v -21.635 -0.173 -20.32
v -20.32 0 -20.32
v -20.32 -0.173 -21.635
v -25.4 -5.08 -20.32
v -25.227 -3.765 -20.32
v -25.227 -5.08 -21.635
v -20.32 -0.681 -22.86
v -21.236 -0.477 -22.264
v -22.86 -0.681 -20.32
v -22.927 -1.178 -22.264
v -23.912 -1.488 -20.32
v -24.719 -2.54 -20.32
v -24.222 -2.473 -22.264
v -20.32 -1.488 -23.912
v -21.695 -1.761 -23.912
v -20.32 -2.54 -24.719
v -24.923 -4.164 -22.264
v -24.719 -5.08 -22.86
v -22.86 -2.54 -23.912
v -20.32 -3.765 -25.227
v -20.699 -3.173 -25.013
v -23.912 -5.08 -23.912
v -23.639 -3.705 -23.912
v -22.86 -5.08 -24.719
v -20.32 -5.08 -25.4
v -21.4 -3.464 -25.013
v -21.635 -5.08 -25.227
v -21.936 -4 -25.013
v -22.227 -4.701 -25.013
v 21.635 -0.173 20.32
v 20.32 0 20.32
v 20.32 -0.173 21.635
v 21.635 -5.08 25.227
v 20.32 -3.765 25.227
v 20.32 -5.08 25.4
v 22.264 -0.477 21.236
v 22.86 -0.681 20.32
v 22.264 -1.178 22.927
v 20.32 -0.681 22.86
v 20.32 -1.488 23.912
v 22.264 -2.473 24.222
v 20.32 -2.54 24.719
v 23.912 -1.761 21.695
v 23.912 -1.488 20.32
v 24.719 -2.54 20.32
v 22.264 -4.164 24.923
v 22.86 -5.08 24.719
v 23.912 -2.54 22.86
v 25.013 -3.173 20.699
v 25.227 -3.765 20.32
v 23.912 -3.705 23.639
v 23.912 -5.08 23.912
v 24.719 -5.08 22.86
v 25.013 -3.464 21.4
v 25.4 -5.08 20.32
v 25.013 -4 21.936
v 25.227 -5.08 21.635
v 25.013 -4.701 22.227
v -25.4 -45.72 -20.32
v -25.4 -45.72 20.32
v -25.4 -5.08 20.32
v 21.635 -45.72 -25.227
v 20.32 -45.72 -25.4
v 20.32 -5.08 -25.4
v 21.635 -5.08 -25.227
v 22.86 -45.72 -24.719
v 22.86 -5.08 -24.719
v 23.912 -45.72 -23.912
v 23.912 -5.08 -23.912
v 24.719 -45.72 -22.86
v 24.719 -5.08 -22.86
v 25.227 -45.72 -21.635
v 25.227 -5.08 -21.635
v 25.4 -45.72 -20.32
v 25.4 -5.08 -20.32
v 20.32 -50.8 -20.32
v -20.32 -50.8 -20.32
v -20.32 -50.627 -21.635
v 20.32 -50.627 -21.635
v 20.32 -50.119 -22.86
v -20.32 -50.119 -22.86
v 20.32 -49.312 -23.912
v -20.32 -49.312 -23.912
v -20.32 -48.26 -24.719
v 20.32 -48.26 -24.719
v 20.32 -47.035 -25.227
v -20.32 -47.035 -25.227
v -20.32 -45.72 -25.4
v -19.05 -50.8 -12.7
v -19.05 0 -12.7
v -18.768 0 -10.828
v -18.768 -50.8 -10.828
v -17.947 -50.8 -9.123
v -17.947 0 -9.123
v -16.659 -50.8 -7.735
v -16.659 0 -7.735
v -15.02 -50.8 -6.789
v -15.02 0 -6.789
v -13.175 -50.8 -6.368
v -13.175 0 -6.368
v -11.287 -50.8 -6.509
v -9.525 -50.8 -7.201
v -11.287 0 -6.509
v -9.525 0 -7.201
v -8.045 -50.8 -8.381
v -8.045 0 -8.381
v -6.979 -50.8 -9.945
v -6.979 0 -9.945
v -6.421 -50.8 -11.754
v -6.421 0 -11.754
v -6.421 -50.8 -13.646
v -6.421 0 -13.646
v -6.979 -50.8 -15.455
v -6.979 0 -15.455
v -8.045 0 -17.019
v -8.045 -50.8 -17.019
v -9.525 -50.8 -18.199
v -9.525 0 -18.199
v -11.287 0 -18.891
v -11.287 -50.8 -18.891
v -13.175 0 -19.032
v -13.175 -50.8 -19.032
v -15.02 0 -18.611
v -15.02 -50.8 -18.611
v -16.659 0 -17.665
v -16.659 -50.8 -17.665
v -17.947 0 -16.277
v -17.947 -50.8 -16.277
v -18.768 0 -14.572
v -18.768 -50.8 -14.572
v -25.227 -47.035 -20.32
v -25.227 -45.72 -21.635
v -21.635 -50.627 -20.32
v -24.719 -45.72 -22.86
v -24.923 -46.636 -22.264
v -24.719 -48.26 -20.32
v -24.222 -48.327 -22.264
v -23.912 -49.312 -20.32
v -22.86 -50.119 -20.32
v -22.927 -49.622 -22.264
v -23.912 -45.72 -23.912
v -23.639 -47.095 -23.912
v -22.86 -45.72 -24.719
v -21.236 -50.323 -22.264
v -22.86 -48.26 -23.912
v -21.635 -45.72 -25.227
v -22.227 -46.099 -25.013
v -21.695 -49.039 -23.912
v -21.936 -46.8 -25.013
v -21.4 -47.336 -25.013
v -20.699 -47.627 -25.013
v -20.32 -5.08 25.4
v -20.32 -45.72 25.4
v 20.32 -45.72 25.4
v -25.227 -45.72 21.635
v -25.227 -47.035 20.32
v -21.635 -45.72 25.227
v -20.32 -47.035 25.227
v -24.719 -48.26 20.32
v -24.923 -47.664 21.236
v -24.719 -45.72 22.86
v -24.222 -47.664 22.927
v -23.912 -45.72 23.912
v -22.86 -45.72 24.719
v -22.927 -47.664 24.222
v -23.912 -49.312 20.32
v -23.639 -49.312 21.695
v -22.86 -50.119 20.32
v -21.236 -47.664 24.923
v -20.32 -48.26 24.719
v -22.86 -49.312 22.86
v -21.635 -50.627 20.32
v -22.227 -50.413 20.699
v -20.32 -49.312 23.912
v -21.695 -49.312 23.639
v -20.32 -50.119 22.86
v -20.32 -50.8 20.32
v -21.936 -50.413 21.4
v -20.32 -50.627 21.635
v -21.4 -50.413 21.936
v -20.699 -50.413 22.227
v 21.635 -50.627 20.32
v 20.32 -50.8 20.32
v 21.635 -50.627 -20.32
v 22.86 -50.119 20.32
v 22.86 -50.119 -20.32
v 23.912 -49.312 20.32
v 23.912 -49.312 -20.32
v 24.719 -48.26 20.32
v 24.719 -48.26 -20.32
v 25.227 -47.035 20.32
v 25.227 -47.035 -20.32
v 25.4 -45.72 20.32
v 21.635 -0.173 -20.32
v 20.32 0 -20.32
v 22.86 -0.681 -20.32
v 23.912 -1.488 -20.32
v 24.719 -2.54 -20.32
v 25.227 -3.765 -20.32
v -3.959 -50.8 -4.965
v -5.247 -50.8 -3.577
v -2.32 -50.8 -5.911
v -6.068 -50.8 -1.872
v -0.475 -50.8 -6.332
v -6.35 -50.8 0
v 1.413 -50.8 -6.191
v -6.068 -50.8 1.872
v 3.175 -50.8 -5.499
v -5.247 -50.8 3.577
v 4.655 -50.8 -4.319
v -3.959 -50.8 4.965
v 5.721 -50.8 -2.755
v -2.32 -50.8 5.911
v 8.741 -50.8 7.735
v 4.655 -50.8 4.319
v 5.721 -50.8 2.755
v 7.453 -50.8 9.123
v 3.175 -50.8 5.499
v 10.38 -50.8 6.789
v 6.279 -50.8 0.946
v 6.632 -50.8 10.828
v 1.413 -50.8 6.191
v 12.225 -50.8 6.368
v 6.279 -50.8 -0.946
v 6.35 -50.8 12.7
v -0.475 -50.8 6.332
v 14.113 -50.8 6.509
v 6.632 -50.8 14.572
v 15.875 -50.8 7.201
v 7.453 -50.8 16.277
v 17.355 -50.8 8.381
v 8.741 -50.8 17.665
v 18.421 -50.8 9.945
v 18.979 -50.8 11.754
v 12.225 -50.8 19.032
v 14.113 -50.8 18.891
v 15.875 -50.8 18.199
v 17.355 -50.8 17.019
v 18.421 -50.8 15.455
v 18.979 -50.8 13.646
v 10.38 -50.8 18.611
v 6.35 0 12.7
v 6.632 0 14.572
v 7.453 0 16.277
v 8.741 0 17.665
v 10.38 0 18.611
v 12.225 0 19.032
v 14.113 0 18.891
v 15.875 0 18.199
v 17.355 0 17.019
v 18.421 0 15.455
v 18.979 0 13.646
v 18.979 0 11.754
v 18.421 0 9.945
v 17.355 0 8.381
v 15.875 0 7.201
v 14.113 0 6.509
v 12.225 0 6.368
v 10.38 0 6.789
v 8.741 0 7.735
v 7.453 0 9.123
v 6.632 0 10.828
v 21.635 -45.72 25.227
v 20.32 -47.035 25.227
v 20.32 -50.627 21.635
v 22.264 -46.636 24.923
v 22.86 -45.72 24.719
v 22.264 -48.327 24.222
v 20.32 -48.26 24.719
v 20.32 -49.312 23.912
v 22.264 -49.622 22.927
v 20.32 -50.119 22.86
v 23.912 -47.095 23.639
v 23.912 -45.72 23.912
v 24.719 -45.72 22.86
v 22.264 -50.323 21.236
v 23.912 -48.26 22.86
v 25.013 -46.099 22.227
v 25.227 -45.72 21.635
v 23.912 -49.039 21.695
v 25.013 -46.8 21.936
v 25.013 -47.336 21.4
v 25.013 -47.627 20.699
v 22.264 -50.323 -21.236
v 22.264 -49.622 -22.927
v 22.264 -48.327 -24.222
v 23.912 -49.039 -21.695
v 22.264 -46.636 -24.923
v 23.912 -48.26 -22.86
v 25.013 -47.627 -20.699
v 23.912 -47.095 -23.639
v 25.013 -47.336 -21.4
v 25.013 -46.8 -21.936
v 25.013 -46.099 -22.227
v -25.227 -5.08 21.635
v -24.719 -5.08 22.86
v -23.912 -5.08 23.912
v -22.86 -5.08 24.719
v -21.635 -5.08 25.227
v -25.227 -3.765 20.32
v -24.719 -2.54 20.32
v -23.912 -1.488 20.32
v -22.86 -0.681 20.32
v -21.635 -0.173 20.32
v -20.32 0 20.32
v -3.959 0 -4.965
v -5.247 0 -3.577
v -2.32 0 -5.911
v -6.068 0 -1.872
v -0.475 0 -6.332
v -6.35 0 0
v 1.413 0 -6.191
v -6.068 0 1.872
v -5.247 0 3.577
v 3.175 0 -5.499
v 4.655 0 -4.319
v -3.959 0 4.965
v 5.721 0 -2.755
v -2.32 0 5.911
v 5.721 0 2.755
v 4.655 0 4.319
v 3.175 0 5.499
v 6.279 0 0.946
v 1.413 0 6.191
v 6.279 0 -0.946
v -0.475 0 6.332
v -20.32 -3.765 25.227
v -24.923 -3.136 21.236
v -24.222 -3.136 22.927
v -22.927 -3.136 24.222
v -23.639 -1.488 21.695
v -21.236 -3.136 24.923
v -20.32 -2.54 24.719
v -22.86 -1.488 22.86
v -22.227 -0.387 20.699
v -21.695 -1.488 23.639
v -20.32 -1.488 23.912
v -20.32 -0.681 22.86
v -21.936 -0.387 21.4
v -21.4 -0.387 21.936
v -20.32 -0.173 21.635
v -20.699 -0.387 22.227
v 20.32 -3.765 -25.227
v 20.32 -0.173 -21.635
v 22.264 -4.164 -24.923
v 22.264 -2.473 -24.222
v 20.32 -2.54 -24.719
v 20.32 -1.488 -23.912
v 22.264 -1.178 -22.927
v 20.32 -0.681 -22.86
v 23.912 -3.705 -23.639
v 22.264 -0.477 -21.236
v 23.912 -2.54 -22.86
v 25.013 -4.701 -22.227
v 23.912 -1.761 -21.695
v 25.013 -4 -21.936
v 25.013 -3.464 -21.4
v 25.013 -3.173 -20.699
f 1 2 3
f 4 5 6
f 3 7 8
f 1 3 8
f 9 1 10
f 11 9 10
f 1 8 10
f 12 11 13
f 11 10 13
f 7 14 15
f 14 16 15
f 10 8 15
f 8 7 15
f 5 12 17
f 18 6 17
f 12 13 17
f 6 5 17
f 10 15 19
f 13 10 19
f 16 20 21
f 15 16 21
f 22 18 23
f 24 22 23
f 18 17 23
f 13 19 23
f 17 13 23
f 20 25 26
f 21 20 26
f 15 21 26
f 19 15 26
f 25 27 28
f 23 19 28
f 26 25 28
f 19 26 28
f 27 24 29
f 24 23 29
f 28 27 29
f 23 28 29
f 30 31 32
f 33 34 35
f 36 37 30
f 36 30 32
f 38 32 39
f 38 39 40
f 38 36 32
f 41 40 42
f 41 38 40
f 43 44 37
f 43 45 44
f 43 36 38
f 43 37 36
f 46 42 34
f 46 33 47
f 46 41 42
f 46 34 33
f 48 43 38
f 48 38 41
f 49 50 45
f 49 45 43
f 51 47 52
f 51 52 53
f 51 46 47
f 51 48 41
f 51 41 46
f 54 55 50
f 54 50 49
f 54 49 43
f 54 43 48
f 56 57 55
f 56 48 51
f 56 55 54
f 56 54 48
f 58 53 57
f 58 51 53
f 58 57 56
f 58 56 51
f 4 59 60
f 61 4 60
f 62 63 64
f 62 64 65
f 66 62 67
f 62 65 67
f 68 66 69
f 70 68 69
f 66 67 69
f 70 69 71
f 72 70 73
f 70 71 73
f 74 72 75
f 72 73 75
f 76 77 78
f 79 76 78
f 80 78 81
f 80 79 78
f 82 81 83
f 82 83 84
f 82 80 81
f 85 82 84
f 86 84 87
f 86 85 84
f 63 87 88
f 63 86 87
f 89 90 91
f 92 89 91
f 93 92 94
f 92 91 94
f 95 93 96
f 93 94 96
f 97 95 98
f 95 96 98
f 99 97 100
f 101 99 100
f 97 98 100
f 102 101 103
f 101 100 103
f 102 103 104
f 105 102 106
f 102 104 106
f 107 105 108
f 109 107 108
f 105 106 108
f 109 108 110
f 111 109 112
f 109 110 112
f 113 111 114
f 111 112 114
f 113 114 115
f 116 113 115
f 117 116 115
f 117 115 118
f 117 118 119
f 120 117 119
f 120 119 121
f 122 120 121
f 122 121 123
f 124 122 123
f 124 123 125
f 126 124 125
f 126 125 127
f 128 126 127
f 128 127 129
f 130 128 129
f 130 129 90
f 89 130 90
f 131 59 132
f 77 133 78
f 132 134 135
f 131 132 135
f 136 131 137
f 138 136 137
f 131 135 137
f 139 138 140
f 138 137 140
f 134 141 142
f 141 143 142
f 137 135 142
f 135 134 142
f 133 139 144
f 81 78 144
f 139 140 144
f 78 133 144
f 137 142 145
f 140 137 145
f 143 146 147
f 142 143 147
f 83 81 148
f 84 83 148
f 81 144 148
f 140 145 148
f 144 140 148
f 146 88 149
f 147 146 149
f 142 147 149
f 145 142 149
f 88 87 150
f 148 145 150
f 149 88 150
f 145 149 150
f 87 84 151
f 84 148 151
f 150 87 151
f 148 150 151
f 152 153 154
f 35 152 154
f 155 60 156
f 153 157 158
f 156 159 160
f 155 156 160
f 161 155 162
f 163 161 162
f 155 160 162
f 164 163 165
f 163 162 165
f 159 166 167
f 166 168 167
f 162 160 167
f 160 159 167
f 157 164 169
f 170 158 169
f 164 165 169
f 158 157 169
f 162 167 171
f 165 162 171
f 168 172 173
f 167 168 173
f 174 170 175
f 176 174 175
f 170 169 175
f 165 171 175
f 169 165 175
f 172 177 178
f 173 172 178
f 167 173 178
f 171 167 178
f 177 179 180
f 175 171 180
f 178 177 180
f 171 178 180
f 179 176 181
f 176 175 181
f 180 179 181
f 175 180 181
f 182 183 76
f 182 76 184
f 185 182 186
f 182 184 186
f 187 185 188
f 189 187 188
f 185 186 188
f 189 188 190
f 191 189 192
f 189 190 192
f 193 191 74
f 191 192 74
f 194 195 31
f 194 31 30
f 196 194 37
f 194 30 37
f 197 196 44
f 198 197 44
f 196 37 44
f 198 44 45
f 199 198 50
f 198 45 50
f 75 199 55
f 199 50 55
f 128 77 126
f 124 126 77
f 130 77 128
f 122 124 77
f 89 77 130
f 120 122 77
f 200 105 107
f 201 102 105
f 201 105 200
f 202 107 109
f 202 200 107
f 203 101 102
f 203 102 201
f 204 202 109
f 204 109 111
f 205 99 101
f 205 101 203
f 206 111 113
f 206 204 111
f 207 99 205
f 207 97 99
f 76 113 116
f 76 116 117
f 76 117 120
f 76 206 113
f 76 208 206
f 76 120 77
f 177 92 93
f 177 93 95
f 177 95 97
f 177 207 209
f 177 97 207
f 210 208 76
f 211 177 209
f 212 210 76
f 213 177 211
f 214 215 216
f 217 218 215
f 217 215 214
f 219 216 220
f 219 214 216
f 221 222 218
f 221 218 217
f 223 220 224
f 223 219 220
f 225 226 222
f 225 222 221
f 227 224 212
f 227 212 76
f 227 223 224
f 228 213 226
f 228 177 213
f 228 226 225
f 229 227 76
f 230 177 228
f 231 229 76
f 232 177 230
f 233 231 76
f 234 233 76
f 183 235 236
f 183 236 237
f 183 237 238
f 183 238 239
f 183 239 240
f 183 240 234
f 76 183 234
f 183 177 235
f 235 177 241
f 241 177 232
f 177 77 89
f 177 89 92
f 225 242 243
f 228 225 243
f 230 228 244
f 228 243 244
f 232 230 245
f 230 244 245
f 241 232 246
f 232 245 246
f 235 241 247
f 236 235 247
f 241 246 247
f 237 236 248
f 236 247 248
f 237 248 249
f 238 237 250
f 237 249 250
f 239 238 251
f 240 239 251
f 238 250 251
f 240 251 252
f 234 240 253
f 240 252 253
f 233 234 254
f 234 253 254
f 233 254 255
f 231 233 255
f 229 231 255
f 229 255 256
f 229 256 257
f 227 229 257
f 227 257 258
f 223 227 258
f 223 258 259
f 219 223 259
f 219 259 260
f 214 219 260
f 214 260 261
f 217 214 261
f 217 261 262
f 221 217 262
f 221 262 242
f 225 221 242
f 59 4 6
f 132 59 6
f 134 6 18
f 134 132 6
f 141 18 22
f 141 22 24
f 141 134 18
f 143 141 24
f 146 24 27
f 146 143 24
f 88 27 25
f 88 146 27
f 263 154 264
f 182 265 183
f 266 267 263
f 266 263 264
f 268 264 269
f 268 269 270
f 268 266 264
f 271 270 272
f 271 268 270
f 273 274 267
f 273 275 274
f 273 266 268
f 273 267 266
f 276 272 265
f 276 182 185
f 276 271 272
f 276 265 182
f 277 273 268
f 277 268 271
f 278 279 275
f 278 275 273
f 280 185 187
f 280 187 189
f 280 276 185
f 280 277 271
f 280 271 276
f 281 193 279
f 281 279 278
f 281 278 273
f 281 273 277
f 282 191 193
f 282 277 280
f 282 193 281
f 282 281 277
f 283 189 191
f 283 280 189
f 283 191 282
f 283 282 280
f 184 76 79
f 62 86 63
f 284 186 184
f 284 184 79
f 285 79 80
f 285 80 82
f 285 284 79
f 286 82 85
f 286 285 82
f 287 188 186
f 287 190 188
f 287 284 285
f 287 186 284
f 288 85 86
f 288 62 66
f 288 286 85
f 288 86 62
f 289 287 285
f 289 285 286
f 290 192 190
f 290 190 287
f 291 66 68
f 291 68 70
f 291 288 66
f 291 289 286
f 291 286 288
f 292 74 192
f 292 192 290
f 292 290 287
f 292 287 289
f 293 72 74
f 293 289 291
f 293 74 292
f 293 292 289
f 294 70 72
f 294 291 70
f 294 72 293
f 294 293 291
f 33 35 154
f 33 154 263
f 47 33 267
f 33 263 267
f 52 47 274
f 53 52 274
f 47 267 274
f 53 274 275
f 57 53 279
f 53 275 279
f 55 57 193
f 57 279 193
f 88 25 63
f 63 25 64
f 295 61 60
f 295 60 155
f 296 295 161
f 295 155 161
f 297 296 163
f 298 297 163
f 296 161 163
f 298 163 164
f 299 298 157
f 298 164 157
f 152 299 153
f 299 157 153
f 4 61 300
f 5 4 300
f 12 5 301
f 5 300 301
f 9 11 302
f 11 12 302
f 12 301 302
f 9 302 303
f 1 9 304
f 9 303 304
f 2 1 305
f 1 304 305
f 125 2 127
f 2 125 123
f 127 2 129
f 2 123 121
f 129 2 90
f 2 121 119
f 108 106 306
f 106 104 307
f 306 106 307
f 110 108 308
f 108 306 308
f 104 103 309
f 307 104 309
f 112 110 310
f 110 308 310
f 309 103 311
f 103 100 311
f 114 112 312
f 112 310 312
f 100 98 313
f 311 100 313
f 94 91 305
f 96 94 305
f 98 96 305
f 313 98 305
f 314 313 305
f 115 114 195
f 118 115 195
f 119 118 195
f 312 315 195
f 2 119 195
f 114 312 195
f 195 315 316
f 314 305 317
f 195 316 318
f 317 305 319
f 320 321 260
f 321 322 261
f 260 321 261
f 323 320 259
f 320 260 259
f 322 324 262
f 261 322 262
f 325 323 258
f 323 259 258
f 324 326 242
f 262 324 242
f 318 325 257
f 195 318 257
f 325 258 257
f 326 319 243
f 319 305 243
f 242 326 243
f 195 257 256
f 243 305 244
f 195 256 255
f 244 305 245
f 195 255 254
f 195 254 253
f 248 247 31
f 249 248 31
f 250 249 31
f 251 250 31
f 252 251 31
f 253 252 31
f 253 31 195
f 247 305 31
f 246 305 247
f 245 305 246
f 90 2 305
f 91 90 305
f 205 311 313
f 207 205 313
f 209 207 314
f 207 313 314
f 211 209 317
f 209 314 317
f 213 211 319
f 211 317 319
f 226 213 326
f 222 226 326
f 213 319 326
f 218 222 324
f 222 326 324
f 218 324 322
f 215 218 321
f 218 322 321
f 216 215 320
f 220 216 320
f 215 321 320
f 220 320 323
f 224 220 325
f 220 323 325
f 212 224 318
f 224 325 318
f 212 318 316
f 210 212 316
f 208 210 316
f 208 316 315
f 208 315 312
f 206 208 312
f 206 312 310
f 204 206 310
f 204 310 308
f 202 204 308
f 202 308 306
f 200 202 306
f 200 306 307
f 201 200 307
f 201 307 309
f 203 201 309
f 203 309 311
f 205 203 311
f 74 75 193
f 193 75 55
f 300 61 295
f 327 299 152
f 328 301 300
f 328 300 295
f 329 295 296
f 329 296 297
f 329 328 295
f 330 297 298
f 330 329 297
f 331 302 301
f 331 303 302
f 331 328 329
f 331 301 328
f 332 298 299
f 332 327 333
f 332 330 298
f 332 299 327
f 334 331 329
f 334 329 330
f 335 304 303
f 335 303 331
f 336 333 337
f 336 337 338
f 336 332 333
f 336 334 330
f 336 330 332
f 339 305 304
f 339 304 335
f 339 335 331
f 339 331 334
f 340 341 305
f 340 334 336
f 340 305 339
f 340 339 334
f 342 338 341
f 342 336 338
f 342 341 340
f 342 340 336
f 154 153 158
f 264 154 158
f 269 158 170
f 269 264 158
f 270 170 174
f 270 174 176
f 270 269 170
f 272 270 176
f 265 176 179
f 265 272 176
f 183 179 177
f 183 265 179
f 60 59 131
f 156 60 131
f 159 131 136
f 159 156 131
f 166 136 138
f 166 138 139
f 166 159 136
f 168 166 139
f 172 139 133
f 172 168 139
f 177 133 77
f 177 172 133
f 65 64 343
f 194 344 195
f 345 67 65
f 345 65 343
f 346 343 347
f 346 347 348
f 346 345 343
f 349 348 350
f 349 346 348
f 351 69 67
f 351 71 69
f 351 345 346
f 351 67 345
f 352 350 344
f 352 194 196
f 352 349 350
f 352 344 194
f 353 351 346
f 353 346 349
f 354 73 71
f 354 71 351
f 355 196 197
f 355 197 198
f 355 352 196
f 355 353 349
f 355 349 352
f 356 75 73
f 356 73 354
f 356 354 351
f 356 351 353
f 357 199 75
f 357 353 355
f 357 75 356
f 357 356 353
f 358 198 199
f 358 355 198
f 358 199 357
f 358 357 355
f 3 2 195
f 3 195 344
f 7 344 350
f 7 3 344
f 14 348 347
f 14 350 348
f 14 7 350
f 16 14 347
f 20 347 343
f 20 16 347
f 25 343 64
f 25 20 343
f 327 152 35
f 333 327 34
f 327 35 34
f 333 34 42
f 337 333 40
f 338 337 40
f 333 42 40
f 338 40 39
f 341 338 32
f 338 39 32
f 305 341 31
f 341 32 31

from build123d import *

# Parameters (mm, degrees)
F0_W     = 50.8
F0_H     = 50.8
F1_DEPTH = 50.8
F2_R     = 6.35
F3_DEPTH = 50.801
F4_R     = 5.08
F5_R     = 5.08
F6_R     = 5.08
F7_R     = 5.08
F8_R     = 5.08


with BuildPart() as f1:
    # F0 (on Front) → F1 (new body)
    with BuildSketch(Plane.XZ):
        Rectangle(F0_W, F0_H)
    extrude(amount=F1_DEPTH)

    # F2 (on face) → F3 (cut, through all)
    with BuildSketch(Plane(origin=(0, 0, 0), x_dir=(-1, 0, 0), z_dir=(0, 1, 0))):
        Circle(F2_R)
        with Locations((12.7, -12.7)):
            Circle(F2_R)
        with Locations((-12.7, 12.7)):
            Circle(F2_R)
    extrude(amount=-F3_DEPTH, mode=Mode.SUBTRACT)

    # F4
    f4_edges = [f1.edges().sort_by_distance(p)[0] for p in [
        (-25.4, -25.4, 25.4),
    ]]
    fillet(f4_edges, radius=F4_R)

    # F5
    f5_edges = [f1.edges().sort_by_distance(p)[0] for p in [
        (-25.4, 0, -2.54),
    ]]
    fillet(f5_edges, radius=F5_R)

    # F6
    f6_edges = [f1.edges().sort_by_distance(p)[0] for p in [
        (-25.4, -50.8, -2.54),
    ]]
    fillet(f6_edges, radius=F6_R)

    # F7
    f7_edges = [f1.edges().sort_by_distance(p)[0] for p in [
        (-25.4, -25.4, -25.4),
    ]]
    fillet(f7_edges, radius=F7_R)

    # F8
    f8_edges = [f1.edges().sort_by_distance(p)[0] for p in [
        (25.4, 0, 0),
    ]]
    fillet(f8_edges, radius=F8_R)


solid = f1.part
